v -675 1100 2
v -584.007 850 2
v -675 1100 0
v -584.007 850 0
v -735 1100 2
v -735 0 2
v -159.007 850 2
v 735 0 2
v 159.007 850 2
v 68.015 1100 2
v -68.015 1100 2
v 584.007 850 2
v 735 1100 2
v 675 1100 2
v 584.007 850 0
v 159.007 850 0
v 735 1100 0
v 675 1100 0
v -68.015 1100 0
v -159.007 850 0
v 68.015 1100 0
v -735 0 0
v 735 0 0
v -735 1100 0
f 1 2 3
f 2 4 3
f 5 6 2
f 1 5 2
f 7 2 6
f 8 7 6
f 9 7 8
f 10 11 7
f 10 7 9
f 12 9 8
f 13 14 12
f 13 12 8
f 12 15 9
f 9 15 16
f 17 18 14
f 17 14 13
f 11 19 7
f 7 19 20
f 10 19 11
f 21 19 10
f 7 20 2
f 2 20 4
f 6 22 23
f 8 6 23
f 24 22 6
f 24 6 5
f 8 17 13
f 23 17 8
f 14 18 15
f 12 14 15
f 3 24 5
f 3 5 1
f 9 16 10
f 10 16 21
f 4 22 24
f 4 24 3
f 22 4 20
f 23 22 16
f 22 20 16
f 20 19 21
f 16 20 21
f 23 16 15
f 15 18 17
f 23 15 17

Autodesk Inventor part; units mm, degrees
ref_plane "YZ Plane" through (0, 0, 0) normal (1, 0, 0) x (0, 1, 0)
ref_plane "XZ Plane" through (0, 0, 0) normal (0, 1, 0) x (-1, 0, 0)
ref_plane "XY Plane" through (0, 0, 0) normal (0, 0, 1) x (1, 0, 0)
sketch "Sketch3" plane through (0, 0, 0) normal (0, 0, 1) x (1, 0, 0)
  line L0 (735, 1100) -> (735, 35.3553)
  line L1 (735, 35.3553) -> (699.6447, 0)
  line L2 (699.6447, 0) -> (-699.6447, 0)
  line L3 (-699.6447, 0) -> (-735, 35.3553)
  line L4 (-735, 35.3553) -> (-735, 1100)
  line L5 (-735, 1100) -> (735, 1100)
  line L6 (0, 0) -> (0, 1100) construction
  line L7 (675, 1100) -> (584.0074, 850)
  line L8 (584.0074, 850) -> (159.0074, 850)
  line L9 (159.0074, 850) -> (68.0149, 1100)
  line L10 (-68.0149, 1100) -> (-159.0074, 850)
  line L11 (-159.0074, 850) -> (-584.0074, 850)
  line L12 (-584.0074, 850) -> (-675, 1100)
  line L13 (-735, 35.3553) -> (-735, 0)
  line L14 (-735, 0) -> (-699.6447, 0)
  line L15 (699.6447, 0) -> (735, 0)
  line L16 (735, 0) -> (735, 35.3553)
  dimension "d25" = 50
  dimension "d26" = 1100
  dimension "d27" = 1470
  dimension "d32" = 425
  dimension "d33" = 60
  dimension "d35" = 250
  dimension "d38" = 110
extrude "Plate3" add sketch "Sketch3" along normal blind 2 contours L0 L1 L2 L3 L4 L5 L12 L11 L10 L9 L8 L7 | L16 L15 L1 | L14 L13 L3
equation "\"d28\" = Thickness"
equation "\"BendRadius\" = Thickness"
equation "\"BendReliefWidth\" = Thickness"
equation "\"BendReliefDepth\" = 0.5 * Thickness"
equation "\"CornerReliefSize\" = 4 * Thickness"
equation "\"MinimumRemnant\" = 2 * Thickness"
equation "\"TransitionRadius\" = BendRadius"
equation "\"JacobiRadiusSize\" = BendRadius"
equation "\"GapSize\" = Thickness"
equation "\"Thickness\" = 2"
properties part number "GBK-RK-0015 partition 5"
